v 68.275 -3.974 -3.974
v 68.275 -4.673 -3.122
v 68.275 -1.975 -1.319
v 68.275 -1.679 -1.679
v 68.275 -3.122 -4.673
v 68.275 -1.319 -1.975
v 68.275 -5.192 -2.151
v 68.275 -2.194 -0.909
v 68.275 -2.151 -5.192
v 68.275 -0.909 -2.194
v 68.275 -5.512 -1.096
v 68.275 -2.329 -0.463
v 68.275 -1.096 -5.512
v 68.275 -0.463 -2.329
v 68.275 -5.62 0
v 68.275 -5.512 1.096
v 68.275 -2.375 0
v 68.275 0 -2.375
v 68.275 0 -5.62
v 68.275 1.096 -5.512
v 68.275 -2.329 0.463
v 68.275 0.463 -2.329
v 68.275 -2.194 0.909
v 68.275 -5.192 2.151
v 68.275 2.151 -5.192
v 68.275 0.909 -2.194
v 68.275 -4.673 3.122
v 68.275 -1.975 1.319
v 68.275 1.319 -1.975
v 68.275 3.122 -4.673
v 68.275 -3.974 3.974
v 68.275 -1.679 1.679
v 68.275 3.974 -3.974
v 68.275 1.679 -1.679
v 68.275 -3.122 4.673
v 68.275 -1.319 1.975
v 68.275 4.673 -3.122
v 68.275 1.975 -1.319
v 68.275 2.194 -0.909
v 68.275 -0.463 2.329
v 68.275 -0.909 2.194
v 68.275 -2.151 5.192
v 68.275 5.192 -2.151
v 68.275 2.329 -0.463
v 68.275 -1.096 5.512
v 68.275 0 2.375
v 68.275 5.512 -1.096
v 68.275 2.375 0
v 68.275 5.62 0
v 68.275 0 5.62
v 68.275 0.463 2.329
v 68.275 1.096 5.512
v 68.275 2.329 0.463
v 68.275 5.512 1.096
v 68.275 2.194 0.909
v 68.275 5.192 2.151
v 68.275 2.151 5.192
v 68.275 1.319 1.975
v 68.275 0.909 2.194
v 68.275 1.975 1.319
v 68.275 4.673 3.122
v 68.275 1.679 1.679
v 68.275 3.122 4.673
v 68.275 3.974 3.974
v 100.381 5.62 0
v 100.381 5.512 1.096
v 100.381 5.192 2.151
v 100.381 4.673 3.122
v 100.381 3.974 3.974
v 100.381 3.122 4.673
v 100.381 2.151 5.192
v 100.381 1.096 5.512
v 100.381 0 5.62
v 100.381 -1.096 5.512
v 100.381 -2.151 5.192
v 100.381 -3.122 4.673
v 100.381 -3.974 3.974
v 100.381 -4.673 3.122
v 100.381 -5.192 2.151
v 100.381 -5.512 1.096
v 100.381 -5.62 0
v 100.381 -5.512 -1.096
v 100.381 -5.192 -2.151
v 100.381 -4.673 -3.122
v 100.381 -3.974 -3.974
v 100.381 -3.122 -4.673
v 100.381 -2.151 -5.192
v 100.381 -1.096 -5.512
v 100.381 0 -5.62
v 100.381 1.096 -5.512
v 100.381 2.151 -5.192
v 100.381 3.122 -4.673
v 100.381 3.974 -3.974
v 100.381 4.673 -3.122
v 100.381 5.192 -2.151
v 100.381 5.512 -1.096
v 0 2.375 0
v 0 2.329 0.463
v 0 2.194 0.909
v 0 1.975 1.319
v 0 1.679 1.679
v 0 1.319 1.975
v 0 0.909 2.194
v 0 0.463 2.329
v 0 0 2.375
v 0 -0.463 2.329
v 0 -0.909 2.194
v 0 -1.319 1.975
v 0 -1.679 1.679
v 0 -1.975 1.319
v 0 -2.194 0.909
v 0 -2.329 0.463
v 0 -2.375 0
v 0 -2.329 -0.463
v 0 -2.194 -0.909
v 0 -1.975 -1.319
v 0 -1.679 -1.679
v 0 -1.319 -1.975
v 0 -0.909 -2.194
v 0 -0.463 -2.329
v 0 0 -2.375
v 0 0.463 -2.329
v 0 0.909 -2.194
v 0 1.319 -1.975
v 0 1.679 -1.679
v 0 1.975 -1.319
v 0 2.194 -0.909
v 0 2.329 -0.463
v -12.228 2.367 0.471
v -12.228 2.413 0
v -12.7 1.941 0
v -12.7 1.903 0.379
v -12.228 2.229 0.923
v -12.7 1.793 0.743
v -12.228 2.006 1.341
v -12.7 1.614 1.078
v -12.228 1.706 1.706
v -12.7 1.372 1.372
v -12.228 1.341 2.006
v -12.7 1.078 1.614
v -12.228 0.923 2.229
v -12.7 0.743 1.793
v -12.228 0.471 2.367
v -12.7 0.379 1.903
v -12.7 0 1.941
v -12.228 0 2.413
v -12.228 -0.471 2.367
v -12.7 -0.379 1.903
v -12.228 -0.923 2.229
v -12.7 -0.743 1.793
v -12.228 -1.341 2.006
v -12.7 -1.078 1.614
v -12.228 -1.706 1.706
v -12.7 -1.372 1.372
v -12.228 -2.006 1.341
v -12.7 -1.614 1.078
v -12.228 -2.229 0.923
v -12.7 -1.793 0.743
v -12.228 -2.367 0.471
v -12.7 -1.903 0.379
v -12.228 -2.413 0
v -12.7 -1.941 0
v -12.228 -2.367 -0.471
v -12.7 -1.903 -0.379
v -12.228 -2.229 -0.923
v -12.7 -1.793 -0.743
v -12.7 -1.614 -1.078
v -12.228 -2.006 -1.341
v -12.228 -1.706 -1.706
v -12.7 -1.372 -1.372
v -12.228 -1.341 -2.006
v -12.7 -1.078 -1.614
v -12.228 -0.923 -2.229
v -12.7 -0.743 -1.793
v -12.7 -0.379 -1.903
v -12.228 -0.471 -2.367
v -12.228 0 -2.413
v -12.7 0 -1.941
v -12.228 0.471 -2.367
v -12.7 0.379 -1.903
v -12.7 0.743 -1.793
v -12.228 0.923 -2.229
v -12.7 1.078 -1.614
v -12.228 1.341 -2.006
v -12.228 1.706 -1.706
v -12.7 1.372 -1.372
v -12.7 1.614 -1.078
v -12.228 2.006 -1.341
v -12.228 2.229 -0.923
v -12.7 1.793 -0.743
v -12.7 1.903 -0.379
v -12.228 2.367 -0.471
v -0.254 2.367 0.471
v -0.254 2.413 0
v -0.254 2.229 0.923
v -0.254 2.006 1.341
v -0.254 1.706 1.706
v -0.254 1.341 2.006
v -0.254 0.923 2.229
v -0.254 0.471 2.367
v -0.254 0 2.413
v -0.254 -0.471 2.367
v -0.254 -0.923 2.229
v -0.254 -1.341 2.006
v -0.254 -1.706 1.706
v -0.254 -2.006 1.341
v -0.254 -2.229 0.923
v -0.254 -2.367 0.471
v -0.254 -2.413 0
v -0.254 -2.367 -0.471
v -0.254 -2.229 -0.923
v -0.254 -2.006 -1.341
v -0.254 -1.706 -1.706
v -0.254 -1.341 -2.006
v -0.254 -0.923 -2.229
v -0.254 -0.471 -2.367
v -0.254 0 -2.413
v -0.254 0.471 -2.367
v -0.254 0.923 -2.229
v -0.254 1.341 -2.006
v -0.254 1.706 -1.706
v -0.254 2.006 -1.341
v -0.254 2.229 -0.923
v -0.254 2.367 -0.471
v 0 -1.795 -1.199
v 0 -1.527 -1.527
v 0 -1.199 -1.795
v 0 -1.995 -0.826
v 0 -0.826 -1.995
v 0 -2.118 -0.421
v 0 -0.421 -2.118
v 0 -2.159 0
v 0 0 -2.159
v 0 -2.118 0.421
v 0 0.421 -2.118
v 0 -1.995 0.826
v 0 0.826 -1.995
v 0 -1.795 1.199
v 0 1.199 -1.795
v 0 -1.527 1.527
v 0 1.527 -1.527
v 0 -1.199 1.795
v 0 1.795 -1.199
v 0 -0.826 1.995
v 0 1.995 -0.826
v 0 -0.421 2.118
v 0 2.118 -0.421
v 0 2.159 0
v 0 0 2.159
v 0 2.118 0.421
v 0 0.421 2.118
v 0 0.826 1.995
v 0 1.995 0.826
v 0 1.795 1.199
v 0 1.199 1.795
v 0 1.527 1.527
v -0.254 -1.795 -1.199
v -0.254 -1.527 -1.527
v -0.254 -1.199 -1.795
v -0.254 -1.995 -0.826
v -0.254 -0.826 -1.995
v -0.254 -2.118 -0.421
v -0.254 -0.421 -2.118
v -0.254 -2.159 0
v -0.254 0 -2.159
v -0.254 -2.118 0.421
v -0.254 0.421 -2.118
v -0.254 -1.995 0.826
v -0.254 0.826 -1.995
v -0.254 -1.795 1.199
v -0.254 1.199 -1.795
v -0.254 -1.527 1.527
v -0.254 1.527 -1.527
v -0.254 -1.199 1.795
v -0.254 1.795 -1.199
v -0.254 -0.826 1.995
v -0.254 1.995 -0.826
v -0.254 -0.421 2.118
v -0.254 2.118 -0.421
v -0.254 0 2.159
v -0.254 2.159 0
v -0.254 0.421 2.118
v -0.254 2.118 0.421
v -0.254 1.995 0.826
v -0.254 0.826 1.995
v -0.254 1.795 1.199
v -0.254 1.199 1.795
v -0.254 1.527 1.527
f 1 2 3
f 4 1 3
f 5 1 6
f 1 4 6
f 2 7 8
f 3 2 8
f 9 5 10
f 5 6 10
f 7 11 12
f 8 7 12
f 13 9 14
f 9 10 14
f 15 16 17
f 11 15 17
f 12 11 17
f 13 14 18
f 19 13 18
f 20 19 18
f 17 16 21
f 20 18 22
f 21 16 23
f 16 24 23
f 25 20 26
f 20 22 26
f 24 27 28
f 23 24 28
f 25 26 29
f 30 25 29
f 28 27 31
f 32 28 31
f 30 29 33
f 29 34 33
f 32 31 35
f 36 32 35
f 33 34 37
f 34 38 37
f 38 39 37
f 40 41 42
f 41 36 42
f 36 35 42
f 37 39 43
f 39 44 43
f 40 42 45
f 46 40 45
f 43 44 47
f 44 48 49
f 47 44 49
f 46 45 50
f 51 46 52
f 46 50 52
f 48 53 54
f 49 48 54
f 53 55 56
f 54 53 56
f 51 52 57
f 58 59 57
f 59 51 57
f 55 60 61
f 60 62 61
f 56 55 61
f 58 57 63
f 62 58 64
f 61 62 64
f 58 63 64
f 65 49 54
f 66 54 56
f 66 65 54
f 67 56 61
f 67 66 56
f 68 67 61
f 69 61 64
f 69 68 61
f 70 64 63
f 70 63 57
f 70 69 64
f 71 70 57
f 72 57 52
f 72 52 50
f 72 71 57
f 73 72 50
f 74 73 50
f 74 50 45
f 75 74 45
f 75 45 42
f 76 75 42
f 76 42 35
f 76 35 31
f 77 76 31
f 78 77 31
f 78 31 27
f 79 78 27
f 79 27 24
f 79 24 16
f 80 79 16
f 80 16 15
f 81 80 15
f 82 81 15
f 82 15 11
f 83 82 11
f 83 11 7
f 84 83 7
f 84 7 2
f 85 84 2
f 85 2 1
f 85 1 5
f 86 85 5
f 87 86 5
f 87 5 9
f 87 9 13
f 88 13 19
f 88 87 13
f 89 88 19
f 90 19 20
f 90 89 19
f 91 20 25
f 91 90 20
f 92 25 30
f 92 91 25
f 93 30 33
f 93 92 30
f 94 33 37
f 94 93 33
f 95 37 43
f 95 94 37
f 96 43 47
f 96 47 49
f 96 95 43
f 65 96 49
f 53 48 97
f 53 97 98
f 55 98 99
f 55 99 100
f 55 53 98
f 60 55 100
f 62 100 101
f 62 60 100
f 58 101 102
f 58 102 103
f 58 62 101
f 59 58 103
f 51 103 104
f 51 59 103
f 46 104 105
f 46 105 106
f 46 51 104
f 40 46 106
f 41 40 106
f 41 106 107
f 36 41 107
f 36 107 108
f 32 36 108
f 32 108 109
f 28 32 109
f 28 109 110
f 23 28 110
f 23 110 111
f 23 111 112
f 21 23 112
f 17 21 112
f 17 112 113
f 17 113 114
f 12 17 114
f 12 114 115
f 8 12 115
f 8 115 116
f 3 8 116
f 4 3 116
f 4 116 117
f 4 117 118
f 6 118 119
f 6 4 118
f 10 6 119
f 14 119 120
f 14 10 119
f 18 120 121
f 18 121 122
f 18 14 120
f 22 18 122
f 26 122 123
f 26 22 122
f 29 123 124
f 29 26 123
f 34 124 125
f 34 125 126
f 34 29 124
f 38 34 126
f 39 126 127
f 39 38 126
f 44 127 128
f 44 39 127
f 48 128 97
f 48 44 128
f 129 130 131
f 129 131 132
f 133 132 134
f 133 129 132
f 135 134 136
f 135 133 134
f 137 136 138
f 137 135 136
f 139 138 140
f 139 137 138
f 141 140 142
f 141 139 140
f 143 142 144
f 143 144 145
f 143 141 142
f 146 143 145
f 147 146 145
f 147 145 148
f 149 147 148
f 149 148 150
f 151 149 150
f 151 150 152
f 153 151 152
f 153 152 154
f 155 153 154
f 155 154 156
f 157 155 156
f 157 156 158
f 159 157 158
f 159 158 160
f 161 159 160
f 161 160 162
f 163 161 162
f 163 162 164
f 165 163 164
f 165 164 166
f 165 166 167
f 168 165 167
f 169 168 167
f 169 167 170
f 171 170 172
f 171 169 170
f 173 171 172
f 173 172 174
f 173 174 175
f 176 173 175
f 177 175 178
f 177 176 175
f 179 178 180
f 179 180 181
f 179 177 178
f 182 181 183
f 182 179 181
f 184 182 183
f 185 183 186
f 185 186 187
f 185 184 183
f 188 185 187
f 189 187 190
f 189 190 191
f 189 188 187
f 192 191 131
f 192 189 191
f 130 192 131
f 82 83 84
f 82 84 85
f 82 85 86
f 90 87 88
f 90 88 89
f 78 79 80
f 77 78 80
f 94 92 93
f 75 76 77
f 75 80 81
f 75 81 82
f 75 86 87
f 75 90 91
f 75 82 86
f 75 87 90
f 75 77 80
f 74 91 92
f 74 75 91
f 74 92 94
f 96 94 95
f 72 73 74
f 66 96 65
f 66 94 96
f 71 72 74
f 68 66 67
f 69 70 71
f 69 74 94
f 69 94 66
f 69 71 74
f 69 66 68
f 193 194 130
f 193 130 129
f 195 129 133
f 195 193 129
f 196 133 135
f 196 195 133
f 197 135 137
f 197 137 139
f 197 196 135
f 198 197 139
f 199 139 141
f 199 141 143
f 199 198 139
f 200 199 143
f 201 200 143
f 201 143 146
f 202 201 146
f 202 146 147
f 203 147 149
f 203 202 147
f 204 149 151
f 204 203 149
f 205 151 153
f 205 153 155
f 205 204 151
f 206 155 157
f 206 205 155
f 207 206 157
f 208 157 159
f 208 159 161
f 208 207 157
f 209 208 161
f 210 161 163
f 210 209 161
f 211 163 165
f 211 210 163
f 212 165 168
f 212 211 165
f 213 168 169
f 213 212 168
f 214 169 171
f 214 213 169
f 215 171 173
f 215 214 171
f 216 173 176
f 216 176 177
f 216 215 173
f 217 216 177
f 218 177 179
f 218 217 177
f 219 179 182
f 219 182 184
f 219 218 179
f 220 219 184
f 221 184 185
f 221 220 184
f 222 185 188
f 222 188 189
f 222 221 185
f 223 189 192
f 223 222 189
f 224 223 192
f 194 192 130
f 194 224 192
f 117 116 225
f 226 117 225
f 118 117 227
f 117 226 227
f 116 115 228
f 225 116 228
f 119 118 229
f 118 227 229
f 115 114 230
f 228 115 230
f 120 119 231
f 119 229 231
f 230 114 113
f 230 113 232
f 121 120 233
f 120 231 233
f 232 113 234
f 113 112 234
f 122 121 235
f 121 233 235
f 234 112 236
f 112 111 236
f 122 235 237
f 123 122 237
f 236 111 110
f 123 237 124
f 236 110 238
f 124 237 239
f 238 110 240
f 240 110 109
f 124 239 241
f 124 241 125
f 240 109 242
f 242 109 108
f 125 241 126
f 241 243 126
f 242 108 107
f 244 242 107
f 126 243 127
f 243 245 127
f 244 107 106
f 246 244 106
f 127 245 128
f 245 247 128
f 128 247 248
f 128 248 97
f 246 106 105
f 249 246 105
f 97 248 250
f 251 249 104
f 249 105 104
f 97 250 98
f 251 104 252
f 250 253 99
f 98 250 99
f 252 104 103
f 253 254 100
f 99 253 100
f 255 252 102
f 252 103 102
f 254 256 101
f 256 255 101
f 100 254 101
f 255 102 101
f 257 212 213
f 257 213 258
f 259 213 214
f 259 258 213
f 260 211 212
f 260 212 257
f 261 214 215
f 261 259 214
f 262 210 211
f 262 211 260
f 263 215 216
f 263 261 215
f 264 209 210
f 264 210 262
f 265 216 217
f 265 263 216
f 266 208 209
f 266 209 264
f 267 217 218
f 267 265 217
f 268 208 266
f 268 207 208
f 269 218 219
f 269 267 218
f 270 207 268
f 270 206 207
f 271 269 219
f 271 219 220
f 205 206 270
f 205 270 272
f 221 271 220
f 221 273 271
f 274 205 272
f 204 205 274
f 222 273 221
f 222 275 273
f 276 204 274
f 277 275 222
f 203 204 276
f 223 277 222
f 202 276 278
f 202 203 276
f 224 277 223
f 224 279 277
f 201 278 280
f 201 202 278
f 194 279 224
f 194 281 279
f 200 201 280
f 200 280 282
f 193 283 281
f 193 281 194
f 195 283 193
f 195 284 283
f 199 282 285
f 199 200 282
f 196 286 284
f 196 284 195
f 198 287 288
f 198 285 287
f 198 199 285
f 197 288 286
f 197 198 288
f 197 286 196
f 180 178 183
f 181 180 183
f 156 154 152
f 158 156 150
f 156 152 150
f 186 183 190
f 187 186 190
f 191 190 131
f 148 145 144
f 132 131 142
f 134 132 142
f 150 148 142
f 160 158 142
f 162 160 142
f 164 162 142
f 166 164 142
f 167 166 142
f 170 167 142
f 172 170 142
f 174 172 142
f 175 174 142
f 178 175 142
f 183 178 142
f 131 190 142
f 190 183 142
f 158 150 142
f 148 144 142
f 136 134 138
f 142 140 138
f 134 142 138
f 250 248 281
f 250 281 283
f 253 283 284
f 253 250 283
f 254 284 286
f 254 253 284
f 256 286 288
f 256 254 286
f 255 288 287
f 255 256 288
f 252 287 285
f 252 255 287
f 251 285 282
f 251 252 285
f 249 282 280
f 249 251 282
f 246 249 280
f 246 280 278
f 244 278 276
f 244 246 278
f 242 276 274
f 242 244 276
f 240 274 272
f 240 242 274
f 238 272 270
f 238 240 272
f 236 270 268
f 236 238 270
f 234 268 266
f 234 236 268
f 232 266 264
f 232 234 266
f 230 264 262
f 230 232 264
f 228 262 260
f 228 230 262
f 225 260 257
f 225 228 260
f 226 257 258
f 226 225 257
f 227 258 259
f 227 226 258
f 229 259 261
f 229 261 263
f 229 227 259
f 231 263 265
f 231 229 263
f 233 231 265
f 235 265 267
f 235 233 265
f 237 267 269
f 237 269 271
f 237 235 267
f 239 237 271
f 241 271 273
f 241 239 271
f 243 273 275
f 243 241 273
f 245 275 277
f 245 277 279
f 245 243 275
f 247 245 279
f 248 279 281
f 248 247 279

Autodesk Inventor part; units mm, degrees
sketch "Sketch_1" plane through (0, 0, 0) normal (0, 0, 1) x (1, 0, 0)
  line L0 (100.3808, 0) -> (0, 0)
  line L1 (0, 0) -> (0, 2.3749)
  line L2 (0, 2.3749) -> (68.2752, 2.3749)
  line L3 (68.2752, 2.3749) -> (68.2752, 5.6197)
  line L4 (68.2752, 5.6197) -> (100.3808, 5.6197)
  line L5 (100.3808, 5.6197) -> (100.3808, 0)
  line L6 (100.3808, 0) -> (0, 0)
revolve "Revolution1" add sketch "Sketch_1" angle 360 about axis through (100.3808, 0, 0) along (1, 0, 0)
sketch "Sketch_3" plane through (0, 0, 0) normal (0, 0, 1) x (1, 0, 0)
  line L0 (0, 0) -> (-12.7, 0)
  line L1 (-12.7, 0) -> (-12.7, 1.9406)
  line L2 (-12.7, 1.9406) -> (-12.2276, 2.413)
  line L3 (-12.2276, 2.413) -> (0, 2.413)
  line L4 (0, 2.413) -> (0, 0)
  line L5 (0, 0) -> (-12.7, 0)
revolve "Revolution2" add sketch "Sketch_3" angle 360 about axis through (0, 0, 0) along (1, 0, 0)
thread "Thread1" size "10-32 UNF" class "2A" standard "ANSI Unified Screw Threads" full length
sketch "Sketch_30" plane through (0, 0, 0) normal (0, 0, 1) x (1, 0, 0)
  line L0 (0, 0) -> (-0.254, 0)
  line L1 (-0.254, 2.159) -> (0, 2.159)
  line L2 (0, 2.159) -> (0, 2.667)
  line L3 (0, 2.667) -> (-0.254, 2.667)
  line L4 (-0.254, 2.667) -> (-0.254, 2.159)
revolve "Revolution3" cut sketch "Sketch_30" angle 360 about axis through (0, 0, 0) along (1, 0, 0)
ref_plane "dia1_XY" through (0, 2.3749, 0) normal (1, 0, 0) x (0, 0, -1)
ref_plane "dia1_YZ" through (0, 2.3749, 0) normal (0, 0, -1) x (0, 1, 0)
ref_plane "dia1_ZX" through (0, 2.3749, 0) normal (0, 1, 0) x (1, 0, 0)
ref_plane "dia12_XY" through (0, 0, 6.1468) normal (1, 0, 0) x (0, 0, -1)
ref_plane "dia12_YZ" through (0, 0, 6.1468) normal (0, 0, -1) x (0, 1, 0)
ref_plane "dia12_ZX" through (0, 0, 6.1468) normal (0, 1, 0) x (1, 0, 0)
ref_plane "dia2_XY" through (0, -2.3749, 0) normal (1, 0, 0) x (0, 0, -1)
ref_plane "dia2_YZ" through (0, -2.3749, 0) normal (0, 0, -1) x (0, 1, 0)
ref_plane "dia2_ZX" through (0, -2.3749, 0) normal (0, 1, 0) x (1, 0, 0)
ref_plane "dia22_XY" through (0, 0, -6.1468) normal (1, 0, 0) x (0, 0, -1)
ref_plane "dia22_YZ" through (0, 0, -6.1468) normal (0, 0, -1) x (0, 1, 0)
ref_plane "dia22_ZX" through (0, 0, -6.1468) normal (0, 1, 0) x (1, 0, 0)
ref_plane "rl1_XY" through (-12.7, 0, 0) normal (1, 0, 0) x (0, 0, -1)
ref_plane "rl1_YZ" through (-12.7, 0, 0) normal (0, 0, -1) x (0, 1, 0)
ref_plane "rl1_ZX" through (-12.7, 0, 0) normal (0, 1, 0) x (1, 0, 0)
ref_plane "rl2_XY" through (0, 0, 0) normal (1, 0, 0) x (0, 0, -1)
ref_plane "rl2_YZ" through (0, 0, 0) normal (0, 0, -1) x (0, 1, 0)
ref_plane "rl2_ZX" through (0, 0, 0) normal (0, 1, 0) x (1, 0, 0)
ref_plane "rod_cp_XY" through (0, 0, 0) normal (1, 0, 0) x (0, 0, -1)
ref_plane "rod_cp_YZ" through (0, 0, 0) normal (0, 0, -1) x (0, 1, 0)
ref_plane "rod_cp_ZX" through (0, 0, 0) normal (0, 1, 0) x (1, 0, 0)
ref_plane "thd1_XY" through (-12.7, 2.413, 0) normal (1, 0, 0) x (0, 0, -1)
ref_plane "thd1_YZ" through (-12.7, 2.413, 0) normal (0, 0, -1) x (0, 1, 0)
ref_plane "thd1_ZX" through (-12.7, 2.413, 0) normal (0, 1, 0) x (1, 0, 0)
ref_plane "thd2_XY" through (-12.7, -2.413, 0) normal (1, 0, 0) x (0, 0, -1)
ref_plane "thd2_YZ" through (-12.7, -2.413, 0) normal (0, 0, -1) x (0, 1, 0)
ref_plane "thd2_ZX" through (-12.7, -2.413, 0) normal (0, 1, 0) x (1, 0, 0)
ref_plane "to_rod_clevis_XY" through (-12.7, 0, 0) normal (1, 0, 0) x (0, 0, -1)
ref_plane "to_rod_clevis_YZ" through (-12.7, 0, 0) normal (0, 0, -1) x (0, 1, 0)
ref_plane "to_rod_clevis_ZX" through (-12.7, 0, 0) normal (0, 1, 0) x (1, 0, 0)
properties part number "M-011-BT1EE110_rod"
